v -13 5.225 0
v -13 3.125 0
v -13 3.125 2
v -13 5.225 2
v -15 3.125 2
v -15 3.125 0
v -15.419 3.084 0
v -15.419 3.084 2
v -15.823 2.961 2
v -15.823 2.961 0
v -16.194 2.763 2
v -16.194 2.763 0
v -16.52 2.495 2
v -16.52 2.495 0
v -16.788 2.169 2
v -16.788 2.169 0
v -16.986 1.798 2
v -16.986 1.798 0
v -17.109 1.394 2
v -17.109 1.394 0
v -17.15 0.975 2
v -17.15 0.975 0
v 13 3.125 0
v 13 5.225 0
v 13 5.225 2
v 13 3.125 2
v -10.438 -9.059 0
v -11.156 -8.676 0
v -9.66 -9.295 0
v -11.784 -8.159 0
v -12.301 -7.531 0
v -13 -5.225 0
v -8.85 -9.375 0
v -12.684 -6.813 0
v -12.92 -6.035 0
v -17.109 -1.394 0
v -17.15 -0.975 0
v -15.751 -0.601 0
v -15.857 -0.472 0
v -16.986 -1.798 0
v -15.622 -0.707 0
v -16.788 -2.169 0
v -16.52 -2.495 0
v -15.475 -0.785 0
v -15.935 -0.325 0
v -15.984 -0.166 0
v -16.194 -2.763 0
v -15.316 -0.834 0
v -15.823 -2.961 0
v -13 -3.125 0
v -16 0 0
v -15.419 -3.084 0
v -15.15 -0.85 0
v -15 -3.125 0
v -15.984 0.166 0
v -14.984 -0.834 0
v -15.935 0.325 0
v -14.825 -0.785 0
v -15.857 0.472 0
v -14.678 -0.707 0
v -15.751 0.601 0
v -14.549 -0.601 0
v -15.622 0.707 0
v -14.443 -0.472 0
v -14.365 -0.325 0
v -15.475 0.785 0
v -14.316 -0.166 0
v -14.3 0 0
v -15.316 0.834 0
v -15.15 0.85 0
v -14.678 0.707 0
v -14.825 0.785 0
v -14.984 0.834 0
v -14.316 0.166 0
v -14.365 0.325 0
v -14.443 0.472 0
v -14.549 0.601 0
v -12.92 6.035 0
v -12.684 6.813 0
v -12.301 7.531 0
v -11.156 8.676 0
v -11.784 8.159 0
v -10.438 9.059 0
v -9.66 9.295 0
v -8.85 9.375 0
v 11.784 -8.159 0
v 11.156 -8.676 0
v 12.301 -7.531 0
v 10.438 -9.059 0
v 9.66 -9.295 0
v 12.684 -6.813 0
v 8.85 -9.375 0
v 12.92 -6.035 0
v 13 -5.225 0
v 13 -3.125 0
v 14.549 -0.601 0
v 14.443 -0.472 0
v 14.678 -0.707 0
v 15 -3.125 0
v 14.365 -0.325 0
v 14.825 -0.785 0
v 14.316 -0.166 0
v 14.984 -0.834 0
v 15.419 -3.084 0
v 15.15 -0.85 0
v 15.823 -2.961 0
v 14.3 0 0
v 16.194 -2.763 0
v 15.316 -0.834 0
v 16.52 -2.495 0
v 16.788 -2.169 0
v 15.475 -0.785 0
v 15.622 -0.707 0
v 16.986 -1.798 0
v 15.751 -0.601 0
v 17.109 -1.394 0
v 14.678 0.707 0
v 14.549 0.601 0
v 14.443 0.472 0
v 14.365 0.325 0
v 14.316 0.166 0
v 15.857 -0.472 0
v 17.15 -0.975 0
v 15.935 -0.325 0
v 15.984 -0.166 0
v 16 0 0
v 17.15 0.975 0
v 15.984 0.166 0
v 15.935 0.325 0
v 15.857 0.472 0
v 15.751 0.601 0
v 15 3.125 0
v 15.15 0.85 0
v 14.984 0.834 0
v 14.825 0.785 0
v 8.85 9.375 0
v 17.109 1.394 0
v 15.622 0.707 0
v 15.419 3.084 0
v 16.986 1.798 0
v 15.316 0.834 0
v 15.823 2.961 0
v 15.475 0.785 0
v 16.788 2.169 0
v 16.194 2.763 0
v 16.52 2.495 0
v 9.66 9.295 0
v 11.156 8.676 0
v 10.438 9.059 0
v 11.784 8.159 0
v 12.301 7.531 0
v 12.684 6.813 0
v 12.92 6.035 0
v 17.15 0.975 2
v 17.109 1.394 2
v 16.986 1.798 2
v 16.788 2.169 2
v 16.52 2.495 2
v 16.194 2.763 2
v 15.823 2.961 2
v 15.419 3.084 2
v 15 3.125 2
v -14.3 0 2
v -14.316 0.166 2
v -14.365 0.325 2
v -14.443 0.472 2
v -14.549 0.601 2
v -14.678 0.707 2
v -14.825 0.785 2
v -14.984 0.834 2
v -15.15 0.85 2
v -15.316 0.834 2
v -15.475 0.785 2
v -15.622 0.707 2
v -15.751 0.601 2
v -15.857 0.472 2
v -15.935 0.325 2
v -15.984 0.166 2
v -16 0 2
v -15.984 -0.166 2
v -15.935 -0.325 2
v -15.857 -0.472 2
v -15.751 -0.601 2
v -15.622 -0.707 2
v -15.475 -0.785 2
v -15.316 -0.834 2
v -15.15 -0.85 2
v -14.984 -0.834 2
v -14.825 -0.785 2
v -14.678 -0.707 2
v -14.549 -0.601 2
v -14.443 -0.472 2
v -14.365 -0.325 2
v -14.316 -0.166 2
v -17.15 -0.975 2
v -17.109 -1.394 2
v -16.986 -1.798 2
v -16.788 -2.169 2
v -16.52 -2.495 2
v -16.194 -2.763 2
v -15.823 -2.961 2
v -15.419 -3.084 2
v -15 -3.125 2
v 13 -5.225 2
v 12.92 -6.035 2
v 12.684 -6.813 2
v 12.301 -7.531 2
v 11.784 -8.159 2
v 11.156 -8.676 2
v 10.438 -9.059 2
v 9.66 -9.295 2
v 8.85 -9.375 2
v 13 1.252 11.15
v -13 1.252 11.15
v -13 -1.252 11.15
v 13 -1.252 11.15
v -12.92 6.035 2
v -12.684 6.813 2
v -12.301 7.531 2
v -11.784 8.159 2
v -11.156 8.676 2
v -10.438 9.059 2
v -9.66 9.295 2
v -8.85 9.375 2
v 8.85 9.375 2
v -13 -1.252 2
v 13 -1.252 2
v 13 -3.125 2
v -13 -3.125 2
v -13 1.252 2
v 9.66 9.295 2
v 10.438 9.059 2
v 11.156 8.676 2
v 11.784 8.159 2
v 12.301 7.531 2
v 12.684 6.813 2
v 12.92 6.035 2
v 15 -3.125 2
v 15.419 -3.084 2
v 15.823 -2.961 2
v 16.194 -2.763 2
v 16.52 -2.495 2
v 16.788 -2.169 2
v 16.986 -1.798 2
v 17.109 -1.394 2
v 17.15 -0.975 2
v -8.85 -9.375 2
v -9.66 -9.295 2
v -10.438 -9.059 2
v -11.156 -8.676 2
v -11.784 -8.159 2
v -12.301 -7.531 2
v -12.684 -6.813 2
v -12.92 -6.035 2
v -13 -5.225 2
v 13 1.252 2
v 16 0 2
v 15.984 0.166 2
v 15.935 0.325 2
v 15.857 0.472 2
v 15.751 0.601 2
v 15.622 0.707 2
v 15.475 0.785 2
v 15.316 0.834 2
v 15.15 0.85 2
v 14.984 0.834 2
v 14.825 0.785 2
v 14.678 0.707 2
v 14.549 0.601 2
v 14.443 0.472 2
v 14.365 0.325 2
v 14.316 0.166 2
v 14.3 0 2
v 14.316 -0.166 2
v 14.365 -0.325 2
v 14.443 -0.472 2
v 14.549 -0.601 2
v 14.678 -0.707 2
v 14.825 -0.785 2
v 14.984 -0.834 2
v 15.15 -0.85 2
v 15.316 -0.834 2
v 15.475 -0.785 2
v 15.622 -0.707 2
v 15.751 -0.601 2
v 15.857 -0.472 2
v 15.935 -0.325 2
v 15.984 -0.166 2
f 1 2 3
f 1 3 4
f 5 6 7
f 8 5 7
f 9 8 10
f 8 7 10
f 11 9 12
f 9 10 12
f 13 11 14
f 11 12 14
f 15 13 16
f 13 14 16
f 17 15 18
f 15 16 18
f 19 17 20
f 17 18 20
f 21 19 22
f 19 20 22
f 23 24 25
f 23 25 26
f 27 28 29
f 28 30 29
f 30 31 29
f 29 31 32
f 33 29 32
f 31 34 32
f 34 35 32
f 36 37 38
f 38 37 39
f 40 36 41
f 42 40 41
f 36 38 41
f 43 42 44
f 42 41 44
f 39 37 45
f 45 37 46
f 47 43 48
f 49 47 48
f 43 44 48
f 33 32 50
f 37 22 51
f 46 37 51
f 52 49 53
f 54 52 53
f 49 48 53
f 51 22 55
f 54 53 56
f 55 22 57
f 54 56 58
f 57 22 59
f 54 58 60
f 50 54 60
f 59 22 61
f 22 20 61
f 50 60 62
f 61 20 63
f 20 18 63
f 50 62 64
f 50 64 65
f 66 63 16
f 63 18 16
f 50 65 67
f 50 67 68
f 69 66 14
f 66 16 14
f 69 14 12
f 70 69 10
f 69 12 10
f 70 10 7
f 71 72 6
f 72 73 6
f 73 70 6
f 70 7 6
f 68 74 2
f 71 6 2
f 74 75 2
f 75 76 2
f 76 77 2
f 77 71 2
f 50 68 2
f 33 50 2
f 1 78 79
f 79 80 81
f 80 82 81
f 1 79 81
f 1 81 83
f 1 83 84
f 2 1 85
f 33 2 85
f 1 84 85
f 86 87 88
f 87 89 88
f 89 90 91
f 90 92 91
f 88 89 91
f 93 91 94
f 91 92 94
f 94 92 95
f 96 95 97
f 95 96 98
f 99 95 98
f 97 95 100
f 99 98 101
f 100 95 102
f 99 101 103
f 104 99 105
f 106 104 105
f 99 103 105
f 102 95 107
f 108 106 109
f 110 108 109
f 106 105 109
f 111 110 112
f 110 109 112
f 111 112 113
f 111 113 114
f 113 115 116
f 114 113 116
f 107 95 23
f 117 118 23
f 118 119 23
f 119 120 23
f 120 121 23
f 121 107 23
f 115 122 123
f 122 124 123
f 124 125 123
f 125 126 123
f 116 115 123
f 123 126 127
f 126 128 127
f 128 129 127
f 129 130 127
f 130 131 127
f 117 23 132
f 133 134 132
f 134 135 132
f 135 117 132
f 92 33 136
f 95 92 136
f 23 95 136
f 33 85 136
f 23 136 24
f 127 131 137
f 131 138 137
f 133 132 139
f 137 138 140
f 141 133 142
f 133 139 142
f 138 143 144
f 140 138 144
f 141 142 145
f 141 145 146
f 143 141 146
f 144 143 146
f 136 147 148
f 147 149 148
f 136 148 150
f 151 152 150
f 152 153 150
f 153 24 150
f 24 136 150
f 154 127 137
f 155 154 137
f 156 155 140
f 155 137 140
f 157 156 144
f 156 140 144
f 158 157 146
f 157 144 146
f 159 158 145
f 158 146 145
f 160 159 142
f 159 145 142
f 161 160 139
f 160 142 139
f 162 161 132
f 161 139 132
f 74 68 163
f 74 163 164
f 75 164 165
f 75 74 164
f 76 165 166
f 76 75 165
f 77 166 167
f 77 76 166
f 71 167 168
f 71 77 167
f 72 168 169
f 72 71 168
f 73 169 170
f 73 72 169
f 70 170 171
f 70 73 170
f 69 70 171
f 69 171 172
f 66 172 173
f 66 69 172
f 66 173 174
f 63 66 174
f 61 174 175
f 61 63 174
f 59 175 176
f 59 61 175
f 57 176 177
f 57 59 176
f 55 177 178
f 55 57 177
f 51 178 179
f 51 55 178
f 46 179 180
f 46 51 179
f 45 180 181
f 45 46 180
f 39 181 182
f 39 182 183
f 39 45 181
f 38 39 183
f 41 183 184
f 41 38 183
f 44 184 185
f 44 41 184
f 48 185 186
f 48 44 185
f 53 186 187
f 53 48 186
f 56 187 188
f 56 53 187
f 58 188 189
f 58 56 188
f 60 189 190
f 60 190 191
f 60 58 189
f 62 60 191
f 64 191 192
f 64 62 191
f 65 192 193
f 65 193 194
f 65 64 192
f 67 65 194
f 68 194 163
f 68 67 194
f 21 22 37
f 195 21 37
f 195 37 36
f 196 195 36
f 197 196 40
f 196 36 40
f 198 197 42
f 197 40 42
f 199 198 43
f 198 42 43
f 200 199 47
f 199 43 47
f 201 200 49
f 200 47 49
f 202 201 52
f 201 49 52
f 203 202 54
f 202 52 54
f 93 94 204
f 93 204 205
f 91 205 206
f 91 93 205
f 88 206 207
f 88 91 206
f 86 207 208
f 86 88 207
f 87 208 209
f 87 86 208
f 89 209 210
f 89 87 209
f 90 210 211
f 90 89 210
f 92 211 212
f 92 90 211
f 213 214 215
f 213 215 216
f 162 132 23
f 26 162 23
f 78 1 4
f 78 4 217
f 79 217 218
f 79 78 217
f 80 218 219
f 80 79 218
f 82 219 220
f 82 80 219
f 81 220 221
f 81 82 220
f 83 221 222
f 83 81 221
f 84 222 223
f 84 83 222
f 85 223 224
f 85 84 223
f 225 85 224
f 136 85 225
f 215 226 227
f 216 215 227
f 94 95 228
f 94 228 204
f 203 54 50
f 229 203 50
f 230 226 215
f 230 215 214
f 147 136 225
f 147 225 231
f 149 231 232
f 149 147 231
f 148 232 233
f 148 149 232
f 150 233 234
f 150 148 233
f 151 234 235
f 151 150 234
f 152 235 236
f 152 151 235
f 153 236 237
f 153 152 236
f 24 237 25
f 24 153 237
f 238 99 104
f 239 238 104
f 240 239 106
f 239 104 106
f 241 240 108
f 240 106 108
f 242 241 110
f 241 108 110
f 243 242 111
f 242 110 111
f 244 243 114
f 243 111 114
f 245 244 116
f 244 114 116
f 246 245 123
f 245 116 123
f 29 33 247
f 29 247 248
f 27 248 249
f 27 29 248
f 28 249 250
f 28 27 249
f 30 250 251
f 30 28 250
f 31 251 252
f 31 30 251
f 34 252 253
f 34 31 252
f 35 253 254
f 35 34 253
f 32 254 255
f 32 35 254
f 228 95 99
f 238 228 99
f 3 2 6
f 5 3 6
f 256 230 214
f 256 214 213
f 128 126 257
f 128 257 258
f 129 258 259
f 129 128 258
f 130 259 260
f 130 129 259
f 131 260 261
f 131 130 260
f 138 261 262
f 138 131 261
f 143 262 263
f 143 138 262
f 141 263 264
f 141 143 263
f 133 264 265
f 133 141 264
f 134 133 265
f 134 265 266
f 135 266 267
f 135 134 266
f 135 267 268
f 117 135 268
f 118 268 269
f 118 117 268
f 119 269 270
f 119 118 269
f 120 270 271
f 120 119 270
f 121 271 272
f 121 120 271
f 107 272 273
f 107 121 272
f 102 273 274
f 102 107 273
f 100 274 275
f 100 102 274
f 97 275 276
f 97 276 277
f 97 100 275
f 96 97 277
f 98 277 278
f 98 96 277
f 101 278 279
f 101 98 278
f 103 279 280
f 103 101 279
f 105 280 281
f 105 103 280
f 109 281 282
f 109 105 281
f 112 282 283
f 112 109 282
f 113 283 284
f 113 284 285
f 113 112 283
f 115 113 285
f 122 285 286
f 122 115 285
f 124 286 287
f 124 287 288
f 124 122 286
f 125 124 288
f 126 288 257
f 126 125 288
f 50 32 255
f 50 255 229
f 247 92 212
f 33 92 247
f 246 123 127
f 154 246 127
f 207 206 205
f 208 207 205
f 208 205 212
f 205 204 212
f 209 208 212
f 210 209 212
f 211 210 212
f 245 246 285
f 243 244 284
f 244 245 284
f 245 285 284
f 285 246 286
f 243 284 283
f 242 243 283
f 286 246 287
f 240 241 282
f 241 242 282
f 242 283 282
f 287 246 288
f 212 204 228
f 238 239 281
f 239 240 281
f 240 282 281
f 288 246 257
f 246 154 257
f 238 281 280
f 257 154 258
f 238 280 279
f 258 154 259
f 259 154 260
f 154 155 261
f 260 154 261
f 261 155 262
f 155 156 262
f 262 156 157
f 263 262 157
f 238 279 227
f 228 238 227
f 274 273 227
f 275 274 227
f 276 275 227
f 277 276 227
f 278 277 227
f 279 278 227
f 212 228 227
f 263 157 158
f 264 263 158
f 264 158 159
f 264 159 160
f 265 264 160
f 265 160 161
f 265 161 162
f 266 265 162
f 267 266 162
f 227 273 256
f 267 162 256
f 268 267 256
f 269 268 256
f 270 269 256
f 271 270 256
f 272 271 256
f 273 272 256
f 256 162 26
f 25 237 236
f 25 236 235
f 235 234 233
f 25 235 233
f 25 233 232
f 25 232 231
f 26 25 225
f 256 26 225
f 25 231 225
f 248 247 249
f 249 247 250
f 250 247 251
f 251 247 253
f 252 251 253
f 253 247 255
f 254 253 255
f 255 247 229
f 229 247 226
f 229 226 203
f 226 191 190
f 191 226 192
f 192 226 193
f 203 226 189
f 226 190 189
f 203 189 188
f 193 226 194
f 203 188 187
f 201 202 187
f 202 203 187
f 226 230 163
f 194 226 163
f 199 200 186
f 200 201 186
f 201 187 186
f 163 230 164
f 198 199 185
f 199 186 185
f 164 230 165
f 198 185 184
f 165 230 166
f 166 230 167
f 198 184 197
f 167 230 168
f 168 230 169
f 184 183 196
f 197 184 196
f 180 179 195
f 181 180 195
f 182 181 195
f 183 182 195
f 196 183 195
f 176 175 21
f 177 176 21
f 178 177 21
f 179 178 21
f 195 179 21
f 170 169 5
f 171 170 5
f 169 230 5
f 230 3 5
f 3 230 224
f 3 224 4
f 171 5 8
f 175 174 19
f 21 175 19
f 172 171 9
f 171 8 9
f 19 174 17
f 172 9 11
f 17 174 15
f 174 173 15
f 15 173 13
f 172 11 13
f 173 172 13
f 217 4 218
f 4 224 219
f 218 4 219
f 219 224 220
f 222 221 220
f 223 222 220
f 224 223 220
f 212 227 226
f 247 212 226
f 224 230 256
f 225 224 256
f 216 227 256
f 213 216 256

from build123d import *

# Parameters (mm, degrees)
CROQUIS1_R              = 0.85
SALIENTE_EXTRUIR1_DEPTH = 2
CROQUIS2_W              = 26
CROQUIS2_H              = 2.5032448
SALIENTE_EXTRUIR3_DEPTH = 11.15


with BuildPart() as part:
    # Croquis1 → Saliente-Extruir1 (new body)
    # profile 1 of 3: a face of its own
    with BuildSketch(Plane.XY):
        with BuildLine():
            Line((8.85, -9.375), (-8.85, -9.375))
            ThreePointArc((-8.85, -9.375), (-11.784493142, -8.159493142), (-13, -5.225))
            Line((-13, -5.225), (-13, 5.225))
            ThreePointArc((-13, 5.225), (-11.784493142, 8.159493142), (-8.85, 9.375))
            Line((-8.85, 9.375), (8.85, 9.375))
            ThreePointArc((8.85, 9.375), (11.784493142, 8.159493142), (13, 5.225))
            Line((13, 5.225), (13, -5.225))
            ThreePointArc((13, -5.225), (11.784493142, -8.159493142), (8.85, -9.375))
        make_face()
    # profile 2 of 3: a face of its own
    with BuildSketch(Plane.XY):
        with BuildLine():
            Line((-15, -3.125), (-13, -3.125))
            Line((-13, -3.125), (-13, 3.125))
            Line((-13, 3.125), (-15, 3.125))
            ThreePointArc((-15, 3.125), (-16.52027958, 2.49527958), (-17.15, 0.975))
            Line((-17.15, 0.975), (-17.15, -0.975))
            ThreePointArc((-17.15, -0.975), (-16.52027958, -2.49527958), (-15, -3.125))
        make_face()
        with Locations((-15.15, 0)):
            Circle(CROQUIS1_R, mode=Mode.SUBTRACT)
    # profile 3 of 3: a face of its own
    with BuildSketch(Plane.XY):
        with BuildLine():
            Line((13, 3.125), (13, -3.125))
            Line((13, -3.125), (15, -3.125))
            ThreePointArc((15, -3.125), (16.52027958, -2.49527958), (17.15, -0.975))
            Line((17.15, -0.975), (17.15, 0.975))
            ThreePointArc((17.15, 0.975), (16.52027958, 2.49527958), (15, 3.125))
            Line((15, 3.125), (13, 3.125))
        make_face()
        with Locations((15.15, 0)):
            Circle(CROQUIS1_R, mode=Mode.SUBTRACT)
    extrude(amount=SALIENTE_EXTRUIR1_DEPTH)

    # Croquis2 → Saliente-Extruir3 (add)
    with BuildSketch(Plane.XY):
        Rectangle(CROQUIS2_W, CROQUIS2_H)
    extrude(amount=SALIENTE_EXTRUIR3_DEPTH)


solid = part.part
